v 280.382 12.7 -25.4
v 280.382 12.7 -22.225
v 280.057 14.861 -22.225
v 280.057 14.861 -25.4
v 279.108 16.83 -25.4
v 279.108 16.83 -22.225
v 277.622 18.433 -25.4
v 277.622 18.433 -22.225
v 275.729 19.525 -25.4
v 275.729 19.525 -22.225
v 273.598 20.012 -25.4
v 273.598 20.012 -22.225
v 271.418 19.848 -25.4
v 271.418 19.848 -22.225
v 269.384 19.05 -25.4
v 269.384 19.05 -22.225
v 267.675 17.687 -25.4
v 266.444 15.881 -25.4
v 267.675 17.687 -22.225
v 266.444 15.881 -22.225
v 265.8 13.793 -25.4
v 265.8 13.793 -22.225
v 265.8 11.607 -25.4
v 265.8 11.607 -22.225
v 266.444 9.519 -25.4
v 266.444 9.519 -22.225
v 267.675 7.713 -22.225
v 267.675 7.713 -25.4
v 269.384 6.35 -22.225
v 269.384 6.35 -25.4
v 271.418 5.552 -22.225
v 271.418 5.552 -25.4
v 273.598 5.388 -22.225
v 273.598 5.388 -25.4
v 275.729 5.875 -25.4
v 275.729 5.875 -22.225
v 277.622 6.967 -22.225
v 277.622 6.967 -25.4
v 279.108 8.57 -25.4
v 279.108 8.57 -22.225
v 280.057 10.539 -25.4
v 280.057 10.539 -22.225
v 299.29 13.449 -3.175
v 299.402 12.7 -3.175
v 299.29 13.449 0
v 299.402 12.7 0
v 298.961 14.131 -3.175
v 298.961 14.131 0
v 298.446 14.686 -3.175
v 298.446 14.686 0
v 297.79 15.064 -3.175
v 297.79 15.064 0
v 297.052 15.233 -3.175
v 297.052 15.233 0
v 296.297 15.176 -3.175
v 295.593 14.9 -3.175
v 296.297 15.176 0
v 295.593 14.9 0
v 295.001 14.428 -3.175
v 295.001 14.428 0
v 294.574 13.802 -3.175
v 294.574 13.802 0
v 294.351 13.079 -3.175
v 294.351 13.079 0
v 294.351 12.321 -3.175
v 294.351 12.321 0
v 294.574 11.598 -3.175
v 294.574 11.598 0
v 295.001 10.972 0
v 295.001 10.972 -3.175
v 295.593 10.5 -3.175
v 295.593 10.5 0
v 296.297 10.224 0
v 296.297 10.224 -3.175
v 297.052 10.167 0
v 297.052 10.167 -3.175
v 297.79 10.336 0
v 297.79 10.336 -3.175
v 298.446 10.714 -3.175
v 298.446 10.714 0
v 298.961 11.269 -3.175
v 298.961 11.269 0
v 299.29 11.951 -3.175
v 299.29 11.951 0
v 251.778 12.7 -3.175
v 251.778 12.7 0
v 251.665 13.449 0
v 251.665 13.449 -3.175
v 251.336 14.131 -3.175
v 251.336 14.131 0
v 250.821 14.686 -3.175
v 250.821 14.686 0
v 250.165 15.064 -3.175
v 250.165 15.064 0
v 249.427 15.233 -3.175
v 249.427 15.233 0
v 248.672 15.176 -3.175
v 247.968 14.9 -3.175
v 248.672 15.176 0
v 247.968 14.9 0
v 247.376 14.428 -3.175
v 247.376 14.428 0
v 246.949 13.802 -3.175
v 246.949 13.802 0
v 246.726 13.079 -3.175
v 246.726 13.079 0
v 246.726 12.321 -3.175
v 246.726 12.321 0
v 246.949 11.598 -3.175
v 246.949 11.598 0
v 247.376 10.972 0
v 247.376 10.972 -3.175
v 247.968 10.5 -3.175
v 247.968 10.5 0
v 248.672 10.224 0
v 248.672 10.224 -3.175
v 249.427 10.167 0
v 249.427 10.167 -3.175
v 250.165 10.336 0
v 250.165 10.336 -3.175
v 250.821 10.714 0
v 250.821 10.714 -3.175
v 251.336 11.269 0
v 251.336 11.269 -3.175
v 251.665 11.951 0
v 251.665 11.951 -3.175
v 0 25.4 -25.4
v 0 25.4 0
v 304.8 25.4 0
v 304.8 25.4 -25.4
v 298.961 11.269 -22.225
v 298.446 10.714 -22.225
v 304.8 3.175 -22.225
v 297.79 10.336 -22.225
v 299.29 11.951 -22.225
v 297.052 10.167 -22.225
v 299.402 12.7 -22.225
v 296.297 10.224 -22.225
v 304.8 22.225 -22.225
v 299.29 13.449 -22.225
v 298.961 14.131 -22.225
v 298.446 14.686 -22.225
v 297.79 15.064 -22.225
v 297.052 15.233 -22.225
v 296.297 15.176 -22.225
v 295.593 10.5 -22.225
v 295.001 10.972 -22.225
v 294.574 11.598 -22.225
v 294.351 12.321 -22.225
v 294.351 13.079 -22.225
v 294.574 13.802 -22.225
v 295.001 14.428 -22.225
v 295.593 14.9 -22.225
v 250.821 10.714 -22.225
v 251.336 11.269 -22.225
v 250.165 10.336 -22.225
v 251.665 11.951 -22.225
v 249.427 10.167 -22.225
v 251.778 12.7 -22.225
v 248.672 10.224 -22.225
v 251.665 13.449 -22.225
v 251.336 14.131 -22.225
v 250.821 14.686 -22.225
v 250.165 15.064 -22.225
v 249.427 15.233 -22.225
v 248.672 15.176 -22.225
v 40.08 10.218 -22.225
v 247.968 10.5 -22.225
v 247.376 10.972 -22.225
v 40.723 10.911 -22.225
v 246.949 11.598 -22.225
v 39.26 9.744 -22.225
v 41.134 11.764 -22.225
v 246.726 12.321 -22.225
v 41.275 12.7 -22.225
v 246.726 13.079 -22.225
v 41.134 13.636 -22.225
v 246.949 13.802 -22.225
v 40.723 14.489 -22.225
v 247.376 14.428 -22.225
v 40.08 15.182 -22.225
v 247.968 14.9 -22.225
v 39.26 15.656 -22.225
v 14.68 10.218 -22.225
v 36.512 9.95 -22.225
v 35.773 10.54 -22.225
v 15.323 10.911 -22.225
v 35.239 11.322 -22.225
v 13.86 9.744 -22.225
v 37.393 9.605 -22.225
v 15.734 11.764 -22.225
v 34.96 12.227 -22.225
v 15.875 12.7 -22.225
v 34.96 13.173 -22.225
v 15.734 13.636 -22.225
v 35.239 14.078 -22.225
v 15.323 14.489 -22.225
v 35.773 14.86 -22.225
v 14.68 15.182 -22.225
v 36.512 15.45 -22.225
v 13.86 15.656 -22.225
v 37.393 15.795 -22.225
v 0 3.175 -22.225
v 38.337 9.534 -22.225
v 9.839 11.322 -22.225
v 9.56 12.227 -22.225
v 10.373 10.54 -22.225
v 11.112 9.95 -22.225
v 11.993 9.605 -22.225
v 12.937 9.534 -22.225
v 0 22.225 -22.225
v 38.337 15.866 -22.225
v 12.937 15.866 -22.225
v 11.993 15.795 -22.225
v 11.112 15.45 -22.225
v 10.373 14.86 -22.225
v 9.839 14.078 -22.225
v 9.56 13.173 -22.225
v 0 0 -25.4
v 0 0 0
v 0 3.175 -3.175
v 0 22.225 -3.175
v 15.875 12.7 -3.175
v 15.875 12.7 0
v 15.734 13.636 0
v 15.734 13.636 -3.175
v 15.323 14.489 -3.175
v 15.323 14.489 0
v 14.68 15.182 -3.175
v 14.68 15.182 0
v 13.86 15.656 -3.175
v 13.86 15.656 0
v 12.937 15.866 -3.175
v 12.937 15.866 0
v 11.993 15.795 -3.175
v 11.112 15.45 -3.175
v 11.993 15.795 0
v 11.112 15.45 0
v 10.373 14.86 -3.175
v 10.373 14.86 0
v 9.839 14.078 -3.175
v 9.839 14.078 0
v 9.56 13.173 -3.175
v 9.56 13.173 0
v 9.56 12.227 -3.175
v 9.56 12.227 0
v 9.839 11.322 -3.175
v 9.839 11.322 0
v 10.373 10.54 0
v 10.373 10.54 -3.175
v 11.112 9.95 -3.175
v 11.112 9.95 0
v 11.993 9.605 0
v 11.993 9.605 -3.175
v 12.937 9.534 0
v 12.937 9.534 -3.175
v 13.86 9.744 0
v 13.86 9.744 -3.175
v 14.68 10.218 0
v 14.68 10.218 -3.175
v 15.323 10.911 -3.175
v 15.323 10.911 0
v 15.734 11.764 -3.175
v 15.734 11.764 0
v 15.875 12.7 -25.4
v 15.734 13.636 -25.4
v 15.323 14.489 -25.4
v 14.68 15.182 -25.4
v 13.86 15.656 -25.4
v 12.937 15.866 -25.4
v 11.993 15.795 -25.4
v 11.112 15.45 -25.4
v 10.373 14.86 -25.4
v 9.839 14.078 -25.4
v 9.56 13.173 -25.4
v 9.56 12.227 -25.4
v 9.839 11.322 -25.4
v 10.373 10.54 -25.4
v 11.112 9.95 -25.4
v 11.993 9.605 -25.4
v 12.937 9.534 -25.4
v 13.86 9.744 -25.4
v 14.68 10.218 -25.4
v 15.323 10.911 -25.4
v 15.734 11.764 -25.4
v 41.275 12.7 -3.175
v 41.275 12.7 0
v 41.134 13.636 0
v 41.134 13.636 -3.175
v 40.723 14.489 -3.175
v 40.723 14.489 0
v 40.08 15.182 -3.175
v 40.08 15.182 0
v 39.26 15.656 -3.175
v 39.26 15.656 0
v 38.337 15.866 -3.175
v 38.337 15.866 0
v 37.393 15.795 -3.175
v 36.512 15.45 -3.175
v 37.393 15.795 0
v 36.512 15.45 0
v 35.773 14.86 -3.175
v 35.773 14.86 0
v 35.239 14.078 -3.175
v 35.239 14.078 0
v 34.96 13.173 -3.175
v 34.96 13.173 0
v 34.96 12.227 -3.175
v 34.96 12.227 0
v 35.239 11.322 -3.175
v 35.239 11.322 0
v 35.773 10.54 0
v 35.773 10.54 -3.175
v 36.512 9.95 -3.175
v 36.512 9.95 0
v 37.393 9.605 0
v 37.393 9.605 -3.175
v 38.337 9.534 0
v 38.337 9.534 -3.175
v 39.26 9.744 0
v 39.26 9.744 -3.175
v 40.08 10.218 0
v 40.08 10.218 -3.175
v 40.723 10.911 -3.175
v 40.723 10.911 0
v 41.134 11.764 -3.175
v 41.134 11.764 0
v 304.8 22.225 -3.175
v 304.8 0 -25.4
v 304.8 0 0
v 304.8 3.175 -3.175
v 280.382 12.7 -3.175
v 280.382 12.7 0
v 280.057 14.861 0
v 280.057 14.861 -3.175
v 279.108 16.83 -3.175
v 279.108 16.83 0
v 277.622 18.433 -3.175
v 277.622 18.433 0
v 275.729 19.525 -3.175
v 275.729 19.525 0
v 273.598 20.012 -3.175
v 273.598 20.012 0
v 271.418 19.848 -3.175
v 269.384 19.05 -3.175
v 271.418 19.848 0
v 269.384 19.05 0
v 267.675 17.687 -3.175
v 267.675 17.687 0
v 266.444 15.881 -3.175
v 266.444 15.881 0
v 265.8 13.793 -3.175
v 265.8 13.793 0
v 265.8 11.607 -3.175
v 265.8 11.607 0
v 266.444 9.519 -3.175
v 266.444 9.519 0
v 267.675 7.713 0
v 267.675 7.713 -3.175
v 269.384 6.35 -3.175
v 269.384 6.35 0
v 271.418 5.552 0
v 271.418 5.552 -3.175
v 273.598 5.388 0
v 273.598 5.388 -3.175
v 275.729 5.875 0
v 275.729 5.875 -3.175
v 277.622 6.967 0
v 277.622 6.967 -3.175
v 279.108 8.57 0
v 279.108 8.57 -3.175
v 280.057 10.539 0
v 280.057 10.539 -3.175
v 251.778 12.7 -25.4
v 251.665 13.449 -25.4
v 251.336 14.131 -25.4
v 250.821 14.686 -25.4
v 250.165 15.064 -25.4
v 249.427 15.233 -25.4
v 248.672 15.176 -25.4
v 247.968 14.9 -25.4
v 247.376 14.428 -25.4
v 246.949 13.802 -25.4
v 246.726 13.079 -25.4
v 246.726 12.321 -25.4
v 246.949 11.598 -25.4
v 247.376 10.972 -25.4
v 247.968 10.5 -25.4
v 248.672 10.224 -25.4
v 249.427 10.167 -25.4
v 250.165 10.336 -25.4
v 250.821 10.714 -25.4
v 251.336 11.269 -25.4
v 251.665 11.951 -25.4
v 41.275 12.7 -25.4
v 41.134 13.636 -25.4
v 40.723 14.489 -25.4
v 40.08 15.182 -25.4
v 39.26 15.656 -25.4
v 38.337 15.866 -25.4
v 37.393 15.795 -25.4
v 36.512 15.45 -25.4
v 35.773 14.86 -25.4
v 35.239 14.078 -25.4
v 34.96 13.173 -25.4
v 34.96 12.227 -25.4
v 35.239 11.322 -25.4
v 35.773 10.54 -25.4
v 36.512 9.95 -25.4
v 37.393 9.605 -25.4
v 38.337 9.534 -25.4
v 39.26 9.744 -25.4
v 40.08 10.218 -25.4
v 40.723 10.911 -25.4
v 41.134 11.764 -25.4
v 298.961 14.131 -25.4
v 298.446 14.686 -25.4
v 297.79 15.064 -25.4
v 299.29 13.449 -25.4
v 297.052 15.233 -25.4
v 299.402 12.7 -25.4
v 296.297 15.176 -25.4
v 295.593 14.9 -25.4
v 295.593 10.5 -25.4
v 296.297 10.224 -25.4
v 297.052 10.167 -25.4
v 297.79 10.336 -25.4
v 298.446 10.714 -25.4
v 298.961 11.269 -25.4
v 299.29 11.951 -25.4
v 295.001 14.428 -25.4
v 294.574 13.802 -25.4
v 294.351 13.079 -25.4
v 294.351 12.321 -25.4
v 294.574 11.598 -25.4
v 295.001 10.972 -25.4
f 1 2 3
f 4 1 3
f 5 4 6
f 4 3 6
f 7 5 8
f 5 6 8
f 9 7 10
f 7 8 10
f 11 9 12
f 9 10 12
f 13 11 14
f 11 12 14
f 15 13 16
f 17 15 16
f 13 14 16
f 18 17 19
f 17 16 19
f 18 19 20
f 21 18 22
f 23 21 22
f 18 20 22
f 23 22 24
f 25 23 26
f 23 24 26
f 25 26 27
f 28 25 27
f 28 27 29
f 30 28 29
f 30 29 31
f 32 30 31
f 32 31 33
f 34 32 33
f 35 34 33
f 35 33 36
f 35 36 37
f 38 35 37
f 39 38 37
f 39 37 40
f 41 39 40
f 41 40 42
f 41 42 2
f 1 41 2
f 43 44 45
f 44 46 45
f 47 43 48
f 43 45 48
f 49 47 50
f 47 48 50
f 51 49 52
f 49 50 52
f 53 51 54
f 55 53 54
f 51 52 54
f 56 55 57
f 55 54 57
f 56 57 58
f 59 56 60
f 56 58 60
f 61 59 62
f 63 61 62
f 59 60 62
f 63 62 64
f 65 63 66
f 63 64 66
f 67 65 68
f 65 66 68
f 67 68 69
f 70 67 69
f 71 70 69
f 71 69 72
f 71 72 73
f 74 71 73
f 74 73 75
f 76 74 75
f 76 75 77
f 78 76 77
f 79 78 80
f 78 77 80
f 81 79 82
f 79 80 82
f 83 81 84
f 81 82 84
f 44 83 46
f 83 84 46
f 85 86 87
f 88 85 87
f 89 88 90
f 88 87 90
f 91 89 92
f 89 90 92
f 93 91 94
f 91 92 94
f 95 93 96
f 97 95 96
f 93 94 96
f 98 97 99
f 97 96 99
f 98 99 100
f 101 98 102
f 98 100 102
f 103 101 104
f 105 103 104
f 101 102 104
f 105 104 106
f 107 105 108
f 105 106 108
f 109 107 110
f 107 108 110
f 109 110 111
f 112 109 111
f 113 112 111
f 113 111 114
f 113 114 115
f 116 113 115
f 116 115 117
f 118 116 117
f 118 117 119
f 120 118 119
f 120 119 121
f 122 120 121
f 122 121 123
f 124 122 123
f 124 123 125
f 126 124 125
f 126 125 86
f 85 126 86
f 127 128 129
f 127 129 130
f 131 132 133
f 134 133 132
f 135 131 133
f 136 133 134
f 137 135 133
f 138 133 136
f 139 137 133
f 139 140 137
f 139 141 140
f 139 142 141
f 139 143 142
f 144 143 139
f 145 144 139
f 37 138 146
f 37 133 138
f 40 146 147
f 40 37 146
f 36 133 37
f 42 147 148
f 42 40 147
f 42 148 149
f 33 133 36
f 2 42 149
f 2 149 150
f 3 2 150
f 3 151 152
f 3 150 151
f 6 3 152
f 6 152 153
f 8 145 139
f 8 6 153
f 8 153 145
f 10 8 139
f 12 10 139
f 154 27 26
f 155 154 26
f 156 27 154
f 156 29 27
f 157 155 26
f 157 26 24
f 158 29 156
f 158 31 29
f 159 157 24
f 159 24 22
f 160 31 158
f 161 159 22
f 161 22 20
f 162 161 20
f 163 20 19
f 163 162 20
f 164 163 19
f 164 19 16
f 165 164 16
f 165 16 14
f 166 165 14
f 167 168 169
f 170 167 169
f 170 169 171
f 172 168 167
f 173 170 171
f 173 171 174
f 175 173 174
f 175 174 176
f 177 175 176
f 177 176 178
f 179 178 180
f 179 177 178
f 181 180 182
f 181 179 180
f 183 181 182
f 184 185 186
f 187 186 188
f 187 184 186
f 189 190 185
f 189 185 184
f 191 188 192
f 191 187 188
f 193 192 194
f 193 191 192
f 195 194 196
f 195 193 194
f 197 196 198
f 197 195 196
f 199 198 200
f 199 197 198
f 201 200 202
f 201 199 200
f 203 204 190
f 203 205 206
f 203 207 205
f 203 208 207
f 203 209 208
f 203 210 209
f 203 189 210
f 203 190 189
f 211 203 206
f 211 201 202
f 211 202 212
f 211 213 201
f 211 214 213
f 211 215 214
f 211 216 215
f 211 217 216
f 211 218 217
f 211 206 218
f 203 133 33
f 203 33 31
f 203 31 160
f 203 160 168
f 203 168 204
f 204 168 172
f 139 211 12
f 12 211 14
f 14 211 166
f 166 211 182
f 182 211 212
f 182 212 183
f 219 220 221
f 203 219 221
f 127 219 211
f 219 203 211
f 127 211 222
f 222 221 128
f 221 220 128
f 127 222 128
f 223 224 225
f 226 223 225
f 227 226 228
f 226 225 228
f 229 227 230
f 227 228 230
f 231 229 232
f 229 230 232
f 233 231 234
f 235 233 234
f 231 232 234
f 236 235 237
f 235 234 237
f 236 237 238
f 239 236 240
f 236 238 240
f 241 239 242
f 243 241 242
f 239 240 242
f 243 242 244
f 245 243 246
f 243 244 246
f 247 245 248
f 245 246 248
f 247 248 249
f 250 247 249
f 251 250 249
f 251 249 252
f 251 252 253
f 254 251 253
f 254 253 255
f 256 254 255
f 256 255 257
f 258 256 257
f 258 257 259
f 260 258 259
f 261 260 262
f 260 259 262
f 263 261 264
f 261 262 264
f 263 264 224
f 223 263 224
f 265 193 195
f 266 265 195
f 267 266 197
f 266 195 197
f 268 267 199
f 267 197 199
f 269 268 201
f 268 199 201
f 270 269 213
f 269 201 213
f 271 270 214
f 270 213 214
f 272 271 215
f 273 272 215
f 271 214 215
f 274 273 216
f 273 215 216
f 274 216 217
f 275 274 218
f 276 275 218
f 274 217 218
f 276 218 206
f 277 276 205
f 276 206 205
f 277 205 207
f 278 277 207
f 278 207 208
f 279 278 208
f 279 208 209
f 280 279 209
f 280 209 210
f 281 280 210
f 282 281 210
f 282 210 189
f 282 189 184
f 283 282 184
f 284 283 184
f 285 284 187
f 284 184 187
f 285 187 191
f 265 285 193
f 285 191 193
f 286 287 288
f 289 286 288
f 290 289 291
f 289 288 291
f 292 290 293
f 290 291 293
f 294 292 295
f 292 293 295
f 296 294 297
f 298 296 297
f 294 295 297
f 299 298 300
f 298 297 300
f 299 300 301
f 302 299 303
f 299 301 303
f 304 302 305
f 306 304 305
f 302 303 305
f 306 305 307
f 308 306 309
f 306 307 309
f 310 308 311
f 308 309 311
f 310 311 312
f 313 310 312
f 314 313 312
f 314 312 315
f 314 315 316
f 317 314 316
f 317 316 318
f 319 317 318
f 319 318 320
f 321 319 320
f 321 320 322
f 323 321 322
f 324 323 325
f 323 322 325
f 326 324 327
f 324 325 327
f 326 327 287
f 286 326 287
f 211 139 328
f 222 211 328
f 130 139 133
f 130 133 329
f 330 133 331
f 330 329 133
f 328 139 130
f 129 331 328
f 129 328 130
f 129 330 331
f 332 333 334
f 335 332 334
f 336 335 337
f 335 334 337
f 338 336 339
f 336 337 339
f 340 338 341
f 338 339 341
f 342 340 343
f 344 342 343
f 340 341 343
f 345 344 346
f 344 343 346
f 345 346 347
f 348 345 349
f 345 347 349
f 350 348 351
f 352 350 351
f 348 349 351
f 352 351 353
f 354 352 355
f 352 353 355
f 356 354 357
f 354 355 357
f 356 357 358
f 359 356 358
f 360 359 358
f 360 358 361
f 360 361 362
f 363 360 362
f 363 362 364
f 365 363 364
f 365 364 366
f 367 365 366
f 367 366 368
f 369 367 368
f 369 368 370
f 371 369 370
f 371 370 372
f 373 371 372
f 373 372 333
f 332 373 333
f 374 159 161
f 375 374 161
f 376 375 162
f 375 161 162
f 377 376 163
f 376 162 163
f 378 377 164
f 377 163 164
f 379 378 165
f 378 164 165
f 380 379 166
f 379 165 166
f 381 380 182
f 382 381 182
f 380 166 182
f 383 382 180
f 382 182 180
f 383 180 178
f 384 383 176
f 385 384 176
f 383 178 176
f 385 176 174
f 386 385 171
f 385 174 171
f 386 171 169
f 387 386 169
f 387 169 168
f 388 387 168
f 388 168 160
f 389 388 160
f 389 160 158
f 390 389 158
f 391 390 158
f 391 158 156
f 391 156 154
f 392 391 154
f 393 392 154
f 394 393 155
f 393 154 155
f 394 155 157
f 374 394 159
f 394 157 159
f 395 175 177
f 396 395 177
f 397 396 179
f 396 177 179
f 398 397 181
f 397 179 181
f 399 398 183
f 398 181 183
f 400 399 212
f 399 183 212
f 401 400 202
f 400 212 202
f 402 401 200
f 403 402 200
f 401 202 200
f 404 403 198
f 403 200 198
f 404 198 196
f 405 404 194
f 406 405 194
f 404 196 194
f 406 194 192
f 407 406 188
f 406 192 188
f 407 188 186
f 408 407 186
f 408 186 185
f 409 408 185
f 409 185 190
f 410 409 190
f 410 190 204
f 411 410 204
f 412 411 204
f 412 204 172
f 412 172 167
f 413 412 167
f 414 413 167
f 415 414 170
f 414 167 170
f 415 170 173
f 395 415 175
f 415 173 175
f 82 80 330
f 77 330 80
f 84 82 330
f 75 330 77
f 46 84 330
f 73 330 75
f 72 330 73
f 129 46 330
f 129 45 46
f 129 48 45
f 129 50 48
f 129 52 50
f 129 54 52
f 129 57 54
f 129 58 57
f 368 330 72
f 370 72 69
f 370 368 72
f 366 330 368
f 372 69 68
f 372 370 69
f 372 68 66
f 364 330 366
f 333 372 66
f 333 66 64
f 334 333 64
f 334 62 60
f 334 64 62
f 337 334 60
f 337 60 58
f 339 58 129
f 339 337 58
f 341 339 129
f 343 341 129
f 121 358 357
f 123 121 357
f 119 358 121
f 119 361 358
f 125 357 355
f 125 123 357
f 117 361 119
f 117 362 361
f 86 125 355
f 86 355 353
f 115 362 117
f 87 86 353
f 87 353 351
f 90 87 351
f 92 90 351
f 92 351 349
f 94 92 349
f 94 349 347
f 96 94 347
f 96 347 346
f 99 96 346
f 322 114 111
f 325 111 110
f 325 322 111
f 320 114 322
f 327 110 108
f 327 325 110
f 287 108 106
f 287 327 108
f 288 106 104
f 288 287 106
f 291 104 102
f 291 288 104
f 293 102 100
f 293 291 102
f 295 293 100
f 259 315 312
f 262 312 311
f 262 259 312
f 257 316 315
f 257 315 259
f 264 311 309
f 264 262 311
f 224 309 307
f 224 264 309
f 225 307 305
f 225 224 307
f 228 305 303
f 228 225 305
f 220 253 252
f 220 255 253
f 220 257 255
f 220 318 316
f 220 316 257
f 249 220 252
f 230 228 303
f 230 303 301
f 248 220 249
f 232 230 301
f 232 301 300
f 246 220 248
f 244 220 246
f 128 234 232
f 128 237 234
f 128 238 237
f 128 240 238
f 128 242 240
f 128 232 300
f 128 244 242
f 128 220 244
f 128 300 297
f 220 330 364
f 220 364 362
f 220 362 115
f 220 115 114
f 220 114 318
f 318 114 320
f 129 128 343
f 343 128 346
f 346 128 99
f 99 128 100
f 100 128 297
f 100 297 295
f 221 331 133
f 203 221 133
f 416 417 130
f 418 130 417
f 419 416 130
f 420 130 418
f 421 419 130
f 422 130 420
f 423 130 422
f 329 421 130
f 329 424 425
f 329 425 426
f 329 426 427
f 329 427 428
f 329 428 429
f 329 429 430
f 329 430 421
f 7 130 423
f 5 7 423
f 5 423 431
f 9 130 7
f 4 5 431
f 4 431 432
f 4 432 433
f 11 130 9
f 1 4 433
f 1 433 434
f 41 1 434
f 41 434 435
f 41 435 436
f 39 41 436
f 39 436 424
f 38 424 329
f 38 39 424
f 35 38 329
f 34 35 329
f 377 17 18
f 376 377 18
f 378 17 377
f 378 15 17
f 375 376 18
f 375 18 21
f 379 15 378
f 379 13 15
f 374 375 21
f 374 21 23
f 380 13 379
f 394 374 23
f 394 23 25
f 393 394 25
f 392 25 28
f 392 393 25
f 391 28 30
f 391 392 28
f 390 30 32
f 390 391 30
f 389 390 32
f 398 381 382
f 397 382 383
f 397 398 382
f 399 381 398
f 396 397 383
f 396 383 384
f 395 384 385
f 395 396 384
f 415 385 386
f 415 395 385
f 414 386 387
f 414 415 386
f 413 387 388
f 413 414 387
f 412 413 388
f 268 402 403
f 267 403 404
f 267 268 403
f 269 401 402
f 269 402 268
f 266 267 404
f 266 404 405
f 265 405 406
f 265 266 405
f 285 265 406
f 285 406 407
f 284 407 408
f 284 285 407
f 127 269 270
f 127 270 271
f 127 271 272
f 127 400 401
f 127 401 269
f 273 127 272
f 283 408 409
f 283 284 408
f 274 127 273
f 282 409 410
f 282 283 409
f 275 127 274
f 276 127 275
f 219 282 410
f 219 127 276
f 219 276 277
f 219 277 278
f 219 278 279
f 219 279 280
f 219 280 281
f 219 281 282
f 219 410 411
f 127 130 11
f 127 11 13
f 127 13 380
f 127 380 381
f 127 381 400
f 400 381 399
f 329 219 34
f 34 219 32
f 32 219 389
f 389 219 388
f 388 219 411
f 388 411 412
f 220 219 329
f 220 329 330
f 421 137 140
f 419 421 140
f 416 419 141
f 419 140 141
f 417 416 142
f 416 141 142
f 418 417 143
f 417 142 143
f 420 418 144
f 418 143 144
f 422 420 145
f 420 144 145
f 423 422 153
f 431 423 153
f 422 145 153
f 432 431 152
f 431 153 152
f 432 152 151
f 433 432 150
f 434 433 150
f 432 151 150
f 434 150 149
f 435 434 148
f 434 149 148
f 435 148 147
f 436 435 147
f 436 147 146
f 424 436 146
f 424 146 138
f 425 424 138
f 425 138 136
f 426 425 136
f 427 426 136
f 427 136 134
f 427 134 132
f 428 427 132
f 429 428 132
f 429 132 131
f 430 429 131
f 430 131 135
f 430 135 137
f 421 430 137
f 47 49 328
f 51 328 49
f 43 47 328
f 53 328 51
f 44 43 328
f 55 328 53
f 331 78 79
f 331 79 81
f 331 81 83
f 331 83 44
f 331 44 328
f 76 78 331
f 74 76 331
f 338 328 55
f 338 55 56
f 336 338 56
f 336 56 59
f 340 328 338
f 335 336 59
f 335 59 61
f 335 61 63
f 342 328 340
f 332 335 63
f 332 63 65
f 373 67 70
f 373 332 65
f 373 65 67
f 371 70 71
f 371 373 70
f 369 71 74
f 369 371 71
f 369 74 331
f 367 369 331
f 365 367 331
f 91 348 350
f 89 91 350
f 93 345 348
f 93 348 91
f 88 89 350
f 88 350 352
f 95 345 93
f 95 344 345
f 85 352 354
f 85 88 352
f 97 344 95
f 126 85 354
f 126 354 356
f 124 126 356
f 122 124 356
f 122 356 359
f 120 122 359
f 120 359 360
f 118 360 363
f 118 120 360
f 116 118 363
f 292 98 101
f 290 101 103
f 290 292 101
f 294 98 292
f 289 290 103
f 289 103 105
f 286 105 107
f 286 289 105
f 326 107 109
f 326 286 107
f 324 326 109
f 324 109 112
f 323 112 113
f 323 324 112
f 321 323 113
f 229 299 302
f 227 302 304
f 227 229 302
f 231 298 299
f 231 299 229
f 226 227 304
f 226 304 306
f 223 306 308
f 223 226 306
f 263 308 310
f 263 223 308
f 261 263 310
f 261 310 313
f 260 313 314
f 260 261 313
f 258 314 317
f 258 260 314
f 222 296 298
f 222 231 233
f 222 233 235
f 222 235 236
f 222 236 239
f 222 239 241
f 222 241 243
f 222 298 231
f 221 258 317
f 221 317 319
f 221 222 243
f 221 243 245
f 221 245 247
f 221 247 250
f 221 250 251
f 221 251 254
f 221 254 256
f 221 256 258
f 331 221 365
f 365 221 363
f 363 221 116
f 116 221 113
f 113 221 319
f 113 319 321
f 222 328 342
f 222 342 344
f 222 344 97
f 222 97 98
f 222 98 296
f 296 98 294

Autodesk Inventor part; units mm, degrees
ref_plane "YZ Plane" through (0, 0, 0) normal (1, 0, 0) x (0, 1, 0)
ref_plane "XZ Plane" through (0, 0, 0) normal (0, 1, 0) x (-1, 0, 0)
ref_plane "XY Plane" through (0, 0, 0) normal (0, 0, 1) x (1, 0, 0)
sketch "Sketch1" plane through (0, 0, 0) normal (1, 0, 0) x (0, 1, 0)
  line L0 (0, 0) -> (25.4, 0)
  line L1 (25.4, 0) -> (25.4, -25.4)
  line L2 (25.4, -25.4) -> (0, -25.4)
  line L3 (0, -25.4) -> (0, 0)
  line L4 (22.225, -3.175) -> (3.175, -3.175)
  line L5 (3.175, -3.175) -> (3.175, -22.225)
  line L6 (3.175, -22.225) -> (22.225, -22.225)
  line L7 (22.225, -22.225) -> (22.225, -3.175)
  dimension "d0" = 25.4
  dimension "d1" = 25.4
  dimension "d2" = 3.175
extrude "Extrusion1" add sketch "Sketch1" along normal blind 304.8
sketch "Sketch2" plane through (0, 0, 0) normal (0, 0, 1) x (1, 0, 0)
  circle A0 centre (273.05, 12.7) radius 23.8125 construction
  line L0 (0, 25.4) -> (304.8, 25.4) construction
  line L1 (304.8, 25.4) -> (304.8, 0) construction
  circle A1 centre (296.8625, 12.7) radius 2.54
  circle A2 centre (249.2375, 12.7) radius 2.54
  line L2 (304.8, 12.7) -> (0, 12.7) construction
  line L3 (0, 0) -> (0, 25.4) construction
  line L4 (276.7162, 19.05) -> (280.3823, 12.7) construction
  line L5 (280.3823, 12.7) -> (276.7162, 6.35) construction
  line L6 (276.7162, 6.35) -> (269.3838, 6.35) construction
  line L7 (269.3838, 6.35) -> (265.7177, 12.7) construction
  line L8 (265.7177, 12.7) -> (269.3838, 19.05) construction
  line L9 (269.3838, 19.05) -> (276.7162, 19.05) construction
  circle A3 centre (273.05, 12.7) radius 7.3323
  circle A4 centre (12.7, 12.7) radius 3.175
  circle A5 centre (38.1, 12.7) radius 3.175
  dimension "d5" = 47.625
  dimension "d6" = 12.7
  dimension "d7" = 31.75
  dimension "d8" = 5.08
  dimension "d9" = 5.08
  dimension "d10" = 12.7
  dimension "d13" = 6.35
  dimension "d14" = 6.35
  dimension "d15" = 12.7
  dimension "d16" = 25.4
extrude "Extrusion2" cut sketch "Sketch2" against normal blind 25.4
properties part number "1x1x12" material "Aluminum 6061"
